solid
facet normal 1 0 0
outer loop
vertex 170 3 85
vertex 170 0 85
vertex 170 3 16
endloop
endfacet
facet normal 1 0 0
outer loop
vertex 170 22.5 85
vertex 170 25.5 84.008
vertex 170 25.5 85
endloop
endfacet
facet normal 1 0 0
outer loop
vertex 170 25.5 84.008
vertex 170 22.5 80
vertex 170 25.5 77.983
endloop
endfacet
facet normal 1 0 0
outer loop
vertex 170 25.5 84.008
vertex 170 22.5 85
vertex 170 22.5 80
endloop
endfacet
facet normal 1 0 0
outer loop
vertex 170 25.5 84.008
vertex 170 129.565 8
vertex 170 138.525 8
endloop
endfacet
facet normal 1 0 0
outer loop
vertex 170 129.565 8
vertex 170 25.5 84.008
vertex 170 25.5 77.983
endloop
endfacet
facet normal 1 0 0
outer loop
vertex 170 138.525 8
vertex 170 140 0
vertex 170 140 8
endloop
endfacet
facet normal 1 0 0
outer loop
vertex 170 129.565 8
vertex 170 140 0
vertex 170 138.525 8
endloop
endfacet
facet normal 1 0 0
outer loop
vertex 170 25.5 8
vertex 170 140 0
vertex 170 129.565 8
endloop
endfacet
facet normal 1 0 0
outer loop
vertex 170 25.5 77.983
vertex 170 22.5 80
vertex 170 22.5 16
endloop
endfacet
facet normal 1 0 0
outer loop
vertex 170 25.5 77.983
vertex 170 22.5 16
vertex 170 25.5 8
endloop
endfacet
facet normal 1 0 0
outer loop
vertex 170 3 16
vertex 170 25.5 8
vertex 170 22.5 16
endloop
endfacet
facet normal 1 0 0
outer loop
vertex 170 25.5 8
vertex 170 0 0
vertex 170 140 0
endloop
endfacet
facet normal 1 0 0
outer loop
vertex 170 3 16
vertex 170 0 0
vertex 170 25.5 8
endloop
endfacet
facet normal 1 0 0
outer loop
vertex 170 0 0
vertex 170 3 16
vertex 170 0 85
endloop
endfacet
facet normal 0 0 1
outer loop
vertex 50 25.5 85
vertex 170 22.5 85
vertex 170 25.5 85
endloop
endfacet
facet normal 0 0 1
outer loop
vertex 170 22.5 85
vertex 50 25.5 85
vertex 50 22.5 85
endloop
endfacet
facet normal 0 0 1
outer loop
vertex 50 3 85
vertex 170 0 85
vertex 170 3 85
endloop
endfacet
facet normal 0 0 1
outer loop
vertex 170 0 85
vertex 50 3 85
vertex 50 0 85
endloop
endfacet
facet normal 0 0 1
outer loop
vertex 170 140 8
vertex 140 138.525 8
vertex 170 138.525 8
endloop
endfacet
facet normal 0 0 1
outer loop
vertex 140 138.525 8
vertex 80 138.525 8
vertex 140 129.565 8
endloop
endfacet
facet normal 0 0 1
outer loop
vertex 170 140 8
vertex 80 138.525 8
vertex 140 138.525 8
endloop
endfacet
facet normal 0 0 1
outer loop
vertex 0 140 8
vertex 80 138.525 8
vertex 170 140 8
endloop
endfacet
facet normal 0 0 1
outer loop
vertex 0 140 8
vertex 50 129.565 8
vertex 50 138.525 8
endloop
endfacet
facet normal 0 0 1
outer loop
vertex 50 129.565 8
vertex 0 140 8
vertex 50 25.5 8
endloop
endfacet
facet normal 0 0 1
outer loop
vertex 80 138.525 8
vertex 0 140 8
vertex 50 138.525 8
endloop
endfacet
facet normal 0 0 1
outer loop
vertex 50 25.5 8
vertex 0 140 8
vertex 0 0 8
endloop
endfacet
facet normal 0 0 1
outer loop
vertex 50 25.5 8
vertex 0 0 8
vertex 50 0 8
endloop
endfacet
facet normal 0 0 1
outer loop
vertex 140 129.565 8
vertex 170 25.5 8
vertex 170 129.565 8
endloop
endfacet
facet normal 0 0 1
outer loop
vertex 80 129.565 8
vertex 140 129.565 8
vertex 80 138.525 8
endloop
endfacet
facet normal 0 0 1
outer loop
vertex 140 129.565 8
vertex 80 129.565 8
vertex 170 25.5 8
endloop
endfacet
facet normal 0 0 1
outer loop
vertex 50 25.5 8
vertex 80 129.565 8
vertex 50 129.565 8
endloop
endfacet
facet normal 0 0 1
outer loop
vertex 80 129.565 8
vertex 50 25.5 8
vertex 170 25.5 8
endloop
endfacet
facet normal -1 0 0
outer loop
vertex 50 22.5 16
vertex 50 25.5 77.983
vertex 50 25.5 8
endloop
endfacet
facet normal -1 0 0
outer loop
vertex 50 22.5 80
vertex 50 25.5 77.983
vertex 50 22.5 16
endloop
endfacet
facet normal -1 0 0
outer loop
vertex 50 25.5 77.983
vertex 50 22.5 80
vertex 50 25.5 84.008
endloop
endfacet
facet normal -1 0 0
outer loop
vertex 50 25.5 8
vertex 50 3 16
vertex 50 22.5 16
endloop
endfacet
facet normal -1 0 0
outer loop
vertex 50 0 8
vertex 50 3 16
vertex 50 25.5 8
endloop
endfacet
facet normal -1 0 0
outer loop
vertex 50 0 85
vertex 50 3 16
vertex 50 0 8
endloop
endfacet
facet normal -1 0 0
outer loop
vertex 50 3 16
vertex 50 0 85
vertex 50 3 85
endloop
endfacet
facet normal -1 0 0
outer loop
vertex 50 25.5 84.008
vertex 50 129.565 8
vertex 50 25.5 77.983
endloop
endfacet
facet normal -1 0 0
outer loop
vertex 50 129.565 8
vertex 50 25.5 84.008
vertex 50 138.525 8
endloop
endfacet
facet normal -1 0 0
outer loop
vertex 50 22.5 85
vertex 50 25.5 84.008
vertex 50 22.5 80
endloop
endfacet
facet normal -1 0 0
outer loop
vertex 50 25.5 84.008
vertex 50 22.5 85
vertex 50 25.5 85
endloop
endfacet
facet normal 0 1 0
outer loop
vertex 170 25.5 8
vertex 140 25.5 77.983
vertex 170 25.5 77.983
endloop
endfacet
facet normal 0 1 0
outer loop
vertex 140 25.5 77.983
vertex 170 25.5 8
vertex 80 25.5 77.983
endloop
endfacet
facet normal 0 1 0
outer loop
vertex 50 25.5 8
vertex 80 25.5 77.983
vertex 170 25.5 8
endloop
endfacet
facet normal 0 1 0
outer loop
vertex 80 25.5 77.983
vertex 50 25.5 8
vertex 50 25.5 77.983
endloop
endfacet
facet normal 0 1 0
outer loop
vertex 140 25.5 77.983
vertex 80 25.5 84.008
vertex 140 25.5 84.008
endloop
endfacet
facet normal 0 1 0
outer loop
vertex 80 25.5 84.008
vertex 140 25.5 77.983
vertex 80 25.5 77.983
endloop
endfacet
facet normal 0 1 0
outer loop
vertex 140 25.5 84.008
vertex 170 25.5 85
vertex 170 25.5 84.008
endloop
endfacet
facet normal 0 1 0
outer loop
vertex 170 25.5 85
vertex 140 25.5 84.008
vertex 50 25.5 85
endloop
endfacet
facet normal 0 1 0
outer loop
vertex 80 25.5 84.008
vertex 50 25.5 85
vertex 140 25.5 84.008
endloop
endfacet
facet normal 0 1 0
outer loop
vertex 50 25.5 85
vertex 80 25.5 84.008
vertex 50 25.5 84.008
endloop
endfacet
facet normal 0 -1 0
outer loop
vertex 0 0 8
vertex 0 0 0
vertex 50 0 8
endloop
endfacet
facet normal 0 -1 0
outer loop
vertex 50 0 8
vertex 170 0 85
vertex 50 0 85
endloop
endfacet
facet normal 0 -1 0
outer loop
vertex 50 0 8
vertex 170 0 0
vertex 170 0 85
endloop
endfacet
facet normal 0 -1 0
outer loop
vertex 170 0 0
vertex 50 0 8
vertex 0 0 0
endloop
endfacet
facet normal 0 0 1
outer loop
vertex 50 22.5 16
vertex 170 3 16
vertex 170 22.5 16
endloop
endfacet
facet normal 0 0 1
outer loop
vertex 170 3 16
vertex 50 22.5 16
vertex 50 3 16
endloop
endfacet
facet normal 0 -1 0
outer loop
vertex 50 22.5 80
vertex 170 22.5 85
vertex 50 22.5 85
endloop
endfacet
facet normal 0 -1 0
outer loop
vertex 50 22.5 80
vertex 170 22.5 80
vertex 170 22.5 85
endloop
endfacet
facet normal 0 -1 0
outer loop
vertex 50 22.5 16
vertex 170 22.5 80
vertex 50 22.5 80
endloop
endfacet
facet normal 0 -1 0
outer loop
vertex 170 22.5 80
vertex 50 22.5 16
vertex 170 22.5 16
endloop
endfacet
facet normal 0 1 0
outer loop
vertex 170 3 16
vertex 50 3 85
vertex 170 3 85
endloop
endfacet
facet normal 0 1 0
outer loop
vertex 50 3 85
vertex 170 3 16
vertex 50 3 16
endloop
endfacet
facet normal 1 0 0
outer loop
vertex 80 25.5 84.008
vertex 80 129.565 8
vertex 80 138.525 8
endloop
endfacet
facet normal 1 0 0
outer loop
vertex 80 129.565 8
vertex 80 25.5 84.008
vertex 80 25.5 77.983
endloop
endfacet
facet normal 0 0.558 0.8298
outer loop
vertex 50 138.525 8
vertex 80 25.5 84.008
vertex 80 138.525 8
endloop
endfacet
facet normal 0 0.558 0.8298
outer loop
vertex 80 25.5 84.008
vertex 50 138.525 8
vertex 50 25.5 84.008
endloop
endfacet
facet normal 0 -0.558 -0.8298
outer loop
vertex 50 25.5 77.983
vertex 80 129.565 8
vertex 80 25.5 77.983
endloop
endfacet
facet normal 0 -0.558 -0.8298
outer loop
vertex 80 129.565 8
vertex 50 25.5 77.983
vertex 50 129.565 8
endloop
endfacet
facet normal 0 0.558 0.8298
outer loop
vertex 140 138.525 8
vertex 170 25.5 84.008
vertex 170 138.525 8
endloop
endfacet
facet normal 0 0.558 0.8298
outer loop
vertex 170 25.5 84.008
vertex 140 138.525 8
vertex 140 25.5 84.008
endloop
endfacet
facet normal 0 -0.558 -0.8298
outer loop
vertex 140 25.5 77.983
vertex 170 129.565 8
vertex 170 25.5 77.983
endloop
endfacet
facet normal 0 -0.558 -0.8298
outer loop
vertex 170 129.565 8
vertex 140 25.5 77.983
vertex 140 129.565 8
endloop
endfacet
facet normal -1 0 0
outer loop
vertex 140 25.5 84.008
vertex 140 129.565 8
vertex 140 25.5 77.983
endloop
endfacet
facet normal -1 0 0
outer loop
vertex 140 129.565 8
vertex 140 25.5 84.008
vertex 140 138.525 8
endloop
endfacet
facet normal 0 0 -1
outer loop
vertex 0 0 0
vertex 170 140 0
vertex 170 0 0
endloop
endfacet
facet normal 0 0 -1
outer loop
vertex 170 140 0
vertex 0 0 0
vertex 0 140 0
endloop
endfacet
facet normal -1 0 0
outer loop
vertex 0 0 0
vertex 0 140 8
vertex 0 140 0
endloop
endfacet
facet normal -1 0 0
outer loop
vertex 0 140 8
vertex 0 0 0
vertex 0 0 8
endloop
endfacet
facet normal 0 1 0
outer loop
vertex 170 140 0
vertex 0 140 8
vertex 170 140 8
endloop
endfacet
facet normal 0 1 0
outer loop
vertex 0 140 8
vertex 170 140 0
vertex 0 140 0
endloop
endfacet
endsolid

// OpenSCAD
// Shelf parameters
shelf_width = 170;
shelf_length = 140;
shelf_height = 8;

// Clip parameters
clip_width = 120;
clip_length = 25.5;
clip_height = 77;
clip_wall = 3;
clip_x_offset = 25;
clip_z_offset = 8;

// Bracket parameters
bracket_width = 30;
bracket_height = 5;

// Bracket length and angle calculated via trigonometry
bracket_length = sqrt(pow((shelf_length - clip_length),2) + pow(clip_height,2));
bracket_angle = atan(clip_height/(shelf_length-clip_length));

// Shelf
cube([shelf_width, shelf_length, shelf_height]);

translate([((shelf_width-clip_width)/2)+clip_x_offset, 0, shelf_height]) {
    // Clip
    difference() {
        cube([clip_width, clip_length, clip_height]);
        translate([0, clip_wall, clip_z_offset]) {
            cube([clip_width, clip_length-(clip_wall*2), clip_height]);
        }
    }
    // Bracket 1
    translate([0, (clip_length-clip_wall), (clip_height-bracket_height)]) {
        rotate([-(bracket_angle),0,0]) {
            cube([bracket_width, bracket_length, bracket_height]);    
        }
    }
    // Bracket 2
    translate([(clip_width-bracket_width), (clip_length-clip_wall), (clip_height-bracket_height)]) {
        rotate([-(bracket_angle),0,0]) {
            cube([bracket_width, bracket_length, bracket_height]);    
        }
    }    
}
